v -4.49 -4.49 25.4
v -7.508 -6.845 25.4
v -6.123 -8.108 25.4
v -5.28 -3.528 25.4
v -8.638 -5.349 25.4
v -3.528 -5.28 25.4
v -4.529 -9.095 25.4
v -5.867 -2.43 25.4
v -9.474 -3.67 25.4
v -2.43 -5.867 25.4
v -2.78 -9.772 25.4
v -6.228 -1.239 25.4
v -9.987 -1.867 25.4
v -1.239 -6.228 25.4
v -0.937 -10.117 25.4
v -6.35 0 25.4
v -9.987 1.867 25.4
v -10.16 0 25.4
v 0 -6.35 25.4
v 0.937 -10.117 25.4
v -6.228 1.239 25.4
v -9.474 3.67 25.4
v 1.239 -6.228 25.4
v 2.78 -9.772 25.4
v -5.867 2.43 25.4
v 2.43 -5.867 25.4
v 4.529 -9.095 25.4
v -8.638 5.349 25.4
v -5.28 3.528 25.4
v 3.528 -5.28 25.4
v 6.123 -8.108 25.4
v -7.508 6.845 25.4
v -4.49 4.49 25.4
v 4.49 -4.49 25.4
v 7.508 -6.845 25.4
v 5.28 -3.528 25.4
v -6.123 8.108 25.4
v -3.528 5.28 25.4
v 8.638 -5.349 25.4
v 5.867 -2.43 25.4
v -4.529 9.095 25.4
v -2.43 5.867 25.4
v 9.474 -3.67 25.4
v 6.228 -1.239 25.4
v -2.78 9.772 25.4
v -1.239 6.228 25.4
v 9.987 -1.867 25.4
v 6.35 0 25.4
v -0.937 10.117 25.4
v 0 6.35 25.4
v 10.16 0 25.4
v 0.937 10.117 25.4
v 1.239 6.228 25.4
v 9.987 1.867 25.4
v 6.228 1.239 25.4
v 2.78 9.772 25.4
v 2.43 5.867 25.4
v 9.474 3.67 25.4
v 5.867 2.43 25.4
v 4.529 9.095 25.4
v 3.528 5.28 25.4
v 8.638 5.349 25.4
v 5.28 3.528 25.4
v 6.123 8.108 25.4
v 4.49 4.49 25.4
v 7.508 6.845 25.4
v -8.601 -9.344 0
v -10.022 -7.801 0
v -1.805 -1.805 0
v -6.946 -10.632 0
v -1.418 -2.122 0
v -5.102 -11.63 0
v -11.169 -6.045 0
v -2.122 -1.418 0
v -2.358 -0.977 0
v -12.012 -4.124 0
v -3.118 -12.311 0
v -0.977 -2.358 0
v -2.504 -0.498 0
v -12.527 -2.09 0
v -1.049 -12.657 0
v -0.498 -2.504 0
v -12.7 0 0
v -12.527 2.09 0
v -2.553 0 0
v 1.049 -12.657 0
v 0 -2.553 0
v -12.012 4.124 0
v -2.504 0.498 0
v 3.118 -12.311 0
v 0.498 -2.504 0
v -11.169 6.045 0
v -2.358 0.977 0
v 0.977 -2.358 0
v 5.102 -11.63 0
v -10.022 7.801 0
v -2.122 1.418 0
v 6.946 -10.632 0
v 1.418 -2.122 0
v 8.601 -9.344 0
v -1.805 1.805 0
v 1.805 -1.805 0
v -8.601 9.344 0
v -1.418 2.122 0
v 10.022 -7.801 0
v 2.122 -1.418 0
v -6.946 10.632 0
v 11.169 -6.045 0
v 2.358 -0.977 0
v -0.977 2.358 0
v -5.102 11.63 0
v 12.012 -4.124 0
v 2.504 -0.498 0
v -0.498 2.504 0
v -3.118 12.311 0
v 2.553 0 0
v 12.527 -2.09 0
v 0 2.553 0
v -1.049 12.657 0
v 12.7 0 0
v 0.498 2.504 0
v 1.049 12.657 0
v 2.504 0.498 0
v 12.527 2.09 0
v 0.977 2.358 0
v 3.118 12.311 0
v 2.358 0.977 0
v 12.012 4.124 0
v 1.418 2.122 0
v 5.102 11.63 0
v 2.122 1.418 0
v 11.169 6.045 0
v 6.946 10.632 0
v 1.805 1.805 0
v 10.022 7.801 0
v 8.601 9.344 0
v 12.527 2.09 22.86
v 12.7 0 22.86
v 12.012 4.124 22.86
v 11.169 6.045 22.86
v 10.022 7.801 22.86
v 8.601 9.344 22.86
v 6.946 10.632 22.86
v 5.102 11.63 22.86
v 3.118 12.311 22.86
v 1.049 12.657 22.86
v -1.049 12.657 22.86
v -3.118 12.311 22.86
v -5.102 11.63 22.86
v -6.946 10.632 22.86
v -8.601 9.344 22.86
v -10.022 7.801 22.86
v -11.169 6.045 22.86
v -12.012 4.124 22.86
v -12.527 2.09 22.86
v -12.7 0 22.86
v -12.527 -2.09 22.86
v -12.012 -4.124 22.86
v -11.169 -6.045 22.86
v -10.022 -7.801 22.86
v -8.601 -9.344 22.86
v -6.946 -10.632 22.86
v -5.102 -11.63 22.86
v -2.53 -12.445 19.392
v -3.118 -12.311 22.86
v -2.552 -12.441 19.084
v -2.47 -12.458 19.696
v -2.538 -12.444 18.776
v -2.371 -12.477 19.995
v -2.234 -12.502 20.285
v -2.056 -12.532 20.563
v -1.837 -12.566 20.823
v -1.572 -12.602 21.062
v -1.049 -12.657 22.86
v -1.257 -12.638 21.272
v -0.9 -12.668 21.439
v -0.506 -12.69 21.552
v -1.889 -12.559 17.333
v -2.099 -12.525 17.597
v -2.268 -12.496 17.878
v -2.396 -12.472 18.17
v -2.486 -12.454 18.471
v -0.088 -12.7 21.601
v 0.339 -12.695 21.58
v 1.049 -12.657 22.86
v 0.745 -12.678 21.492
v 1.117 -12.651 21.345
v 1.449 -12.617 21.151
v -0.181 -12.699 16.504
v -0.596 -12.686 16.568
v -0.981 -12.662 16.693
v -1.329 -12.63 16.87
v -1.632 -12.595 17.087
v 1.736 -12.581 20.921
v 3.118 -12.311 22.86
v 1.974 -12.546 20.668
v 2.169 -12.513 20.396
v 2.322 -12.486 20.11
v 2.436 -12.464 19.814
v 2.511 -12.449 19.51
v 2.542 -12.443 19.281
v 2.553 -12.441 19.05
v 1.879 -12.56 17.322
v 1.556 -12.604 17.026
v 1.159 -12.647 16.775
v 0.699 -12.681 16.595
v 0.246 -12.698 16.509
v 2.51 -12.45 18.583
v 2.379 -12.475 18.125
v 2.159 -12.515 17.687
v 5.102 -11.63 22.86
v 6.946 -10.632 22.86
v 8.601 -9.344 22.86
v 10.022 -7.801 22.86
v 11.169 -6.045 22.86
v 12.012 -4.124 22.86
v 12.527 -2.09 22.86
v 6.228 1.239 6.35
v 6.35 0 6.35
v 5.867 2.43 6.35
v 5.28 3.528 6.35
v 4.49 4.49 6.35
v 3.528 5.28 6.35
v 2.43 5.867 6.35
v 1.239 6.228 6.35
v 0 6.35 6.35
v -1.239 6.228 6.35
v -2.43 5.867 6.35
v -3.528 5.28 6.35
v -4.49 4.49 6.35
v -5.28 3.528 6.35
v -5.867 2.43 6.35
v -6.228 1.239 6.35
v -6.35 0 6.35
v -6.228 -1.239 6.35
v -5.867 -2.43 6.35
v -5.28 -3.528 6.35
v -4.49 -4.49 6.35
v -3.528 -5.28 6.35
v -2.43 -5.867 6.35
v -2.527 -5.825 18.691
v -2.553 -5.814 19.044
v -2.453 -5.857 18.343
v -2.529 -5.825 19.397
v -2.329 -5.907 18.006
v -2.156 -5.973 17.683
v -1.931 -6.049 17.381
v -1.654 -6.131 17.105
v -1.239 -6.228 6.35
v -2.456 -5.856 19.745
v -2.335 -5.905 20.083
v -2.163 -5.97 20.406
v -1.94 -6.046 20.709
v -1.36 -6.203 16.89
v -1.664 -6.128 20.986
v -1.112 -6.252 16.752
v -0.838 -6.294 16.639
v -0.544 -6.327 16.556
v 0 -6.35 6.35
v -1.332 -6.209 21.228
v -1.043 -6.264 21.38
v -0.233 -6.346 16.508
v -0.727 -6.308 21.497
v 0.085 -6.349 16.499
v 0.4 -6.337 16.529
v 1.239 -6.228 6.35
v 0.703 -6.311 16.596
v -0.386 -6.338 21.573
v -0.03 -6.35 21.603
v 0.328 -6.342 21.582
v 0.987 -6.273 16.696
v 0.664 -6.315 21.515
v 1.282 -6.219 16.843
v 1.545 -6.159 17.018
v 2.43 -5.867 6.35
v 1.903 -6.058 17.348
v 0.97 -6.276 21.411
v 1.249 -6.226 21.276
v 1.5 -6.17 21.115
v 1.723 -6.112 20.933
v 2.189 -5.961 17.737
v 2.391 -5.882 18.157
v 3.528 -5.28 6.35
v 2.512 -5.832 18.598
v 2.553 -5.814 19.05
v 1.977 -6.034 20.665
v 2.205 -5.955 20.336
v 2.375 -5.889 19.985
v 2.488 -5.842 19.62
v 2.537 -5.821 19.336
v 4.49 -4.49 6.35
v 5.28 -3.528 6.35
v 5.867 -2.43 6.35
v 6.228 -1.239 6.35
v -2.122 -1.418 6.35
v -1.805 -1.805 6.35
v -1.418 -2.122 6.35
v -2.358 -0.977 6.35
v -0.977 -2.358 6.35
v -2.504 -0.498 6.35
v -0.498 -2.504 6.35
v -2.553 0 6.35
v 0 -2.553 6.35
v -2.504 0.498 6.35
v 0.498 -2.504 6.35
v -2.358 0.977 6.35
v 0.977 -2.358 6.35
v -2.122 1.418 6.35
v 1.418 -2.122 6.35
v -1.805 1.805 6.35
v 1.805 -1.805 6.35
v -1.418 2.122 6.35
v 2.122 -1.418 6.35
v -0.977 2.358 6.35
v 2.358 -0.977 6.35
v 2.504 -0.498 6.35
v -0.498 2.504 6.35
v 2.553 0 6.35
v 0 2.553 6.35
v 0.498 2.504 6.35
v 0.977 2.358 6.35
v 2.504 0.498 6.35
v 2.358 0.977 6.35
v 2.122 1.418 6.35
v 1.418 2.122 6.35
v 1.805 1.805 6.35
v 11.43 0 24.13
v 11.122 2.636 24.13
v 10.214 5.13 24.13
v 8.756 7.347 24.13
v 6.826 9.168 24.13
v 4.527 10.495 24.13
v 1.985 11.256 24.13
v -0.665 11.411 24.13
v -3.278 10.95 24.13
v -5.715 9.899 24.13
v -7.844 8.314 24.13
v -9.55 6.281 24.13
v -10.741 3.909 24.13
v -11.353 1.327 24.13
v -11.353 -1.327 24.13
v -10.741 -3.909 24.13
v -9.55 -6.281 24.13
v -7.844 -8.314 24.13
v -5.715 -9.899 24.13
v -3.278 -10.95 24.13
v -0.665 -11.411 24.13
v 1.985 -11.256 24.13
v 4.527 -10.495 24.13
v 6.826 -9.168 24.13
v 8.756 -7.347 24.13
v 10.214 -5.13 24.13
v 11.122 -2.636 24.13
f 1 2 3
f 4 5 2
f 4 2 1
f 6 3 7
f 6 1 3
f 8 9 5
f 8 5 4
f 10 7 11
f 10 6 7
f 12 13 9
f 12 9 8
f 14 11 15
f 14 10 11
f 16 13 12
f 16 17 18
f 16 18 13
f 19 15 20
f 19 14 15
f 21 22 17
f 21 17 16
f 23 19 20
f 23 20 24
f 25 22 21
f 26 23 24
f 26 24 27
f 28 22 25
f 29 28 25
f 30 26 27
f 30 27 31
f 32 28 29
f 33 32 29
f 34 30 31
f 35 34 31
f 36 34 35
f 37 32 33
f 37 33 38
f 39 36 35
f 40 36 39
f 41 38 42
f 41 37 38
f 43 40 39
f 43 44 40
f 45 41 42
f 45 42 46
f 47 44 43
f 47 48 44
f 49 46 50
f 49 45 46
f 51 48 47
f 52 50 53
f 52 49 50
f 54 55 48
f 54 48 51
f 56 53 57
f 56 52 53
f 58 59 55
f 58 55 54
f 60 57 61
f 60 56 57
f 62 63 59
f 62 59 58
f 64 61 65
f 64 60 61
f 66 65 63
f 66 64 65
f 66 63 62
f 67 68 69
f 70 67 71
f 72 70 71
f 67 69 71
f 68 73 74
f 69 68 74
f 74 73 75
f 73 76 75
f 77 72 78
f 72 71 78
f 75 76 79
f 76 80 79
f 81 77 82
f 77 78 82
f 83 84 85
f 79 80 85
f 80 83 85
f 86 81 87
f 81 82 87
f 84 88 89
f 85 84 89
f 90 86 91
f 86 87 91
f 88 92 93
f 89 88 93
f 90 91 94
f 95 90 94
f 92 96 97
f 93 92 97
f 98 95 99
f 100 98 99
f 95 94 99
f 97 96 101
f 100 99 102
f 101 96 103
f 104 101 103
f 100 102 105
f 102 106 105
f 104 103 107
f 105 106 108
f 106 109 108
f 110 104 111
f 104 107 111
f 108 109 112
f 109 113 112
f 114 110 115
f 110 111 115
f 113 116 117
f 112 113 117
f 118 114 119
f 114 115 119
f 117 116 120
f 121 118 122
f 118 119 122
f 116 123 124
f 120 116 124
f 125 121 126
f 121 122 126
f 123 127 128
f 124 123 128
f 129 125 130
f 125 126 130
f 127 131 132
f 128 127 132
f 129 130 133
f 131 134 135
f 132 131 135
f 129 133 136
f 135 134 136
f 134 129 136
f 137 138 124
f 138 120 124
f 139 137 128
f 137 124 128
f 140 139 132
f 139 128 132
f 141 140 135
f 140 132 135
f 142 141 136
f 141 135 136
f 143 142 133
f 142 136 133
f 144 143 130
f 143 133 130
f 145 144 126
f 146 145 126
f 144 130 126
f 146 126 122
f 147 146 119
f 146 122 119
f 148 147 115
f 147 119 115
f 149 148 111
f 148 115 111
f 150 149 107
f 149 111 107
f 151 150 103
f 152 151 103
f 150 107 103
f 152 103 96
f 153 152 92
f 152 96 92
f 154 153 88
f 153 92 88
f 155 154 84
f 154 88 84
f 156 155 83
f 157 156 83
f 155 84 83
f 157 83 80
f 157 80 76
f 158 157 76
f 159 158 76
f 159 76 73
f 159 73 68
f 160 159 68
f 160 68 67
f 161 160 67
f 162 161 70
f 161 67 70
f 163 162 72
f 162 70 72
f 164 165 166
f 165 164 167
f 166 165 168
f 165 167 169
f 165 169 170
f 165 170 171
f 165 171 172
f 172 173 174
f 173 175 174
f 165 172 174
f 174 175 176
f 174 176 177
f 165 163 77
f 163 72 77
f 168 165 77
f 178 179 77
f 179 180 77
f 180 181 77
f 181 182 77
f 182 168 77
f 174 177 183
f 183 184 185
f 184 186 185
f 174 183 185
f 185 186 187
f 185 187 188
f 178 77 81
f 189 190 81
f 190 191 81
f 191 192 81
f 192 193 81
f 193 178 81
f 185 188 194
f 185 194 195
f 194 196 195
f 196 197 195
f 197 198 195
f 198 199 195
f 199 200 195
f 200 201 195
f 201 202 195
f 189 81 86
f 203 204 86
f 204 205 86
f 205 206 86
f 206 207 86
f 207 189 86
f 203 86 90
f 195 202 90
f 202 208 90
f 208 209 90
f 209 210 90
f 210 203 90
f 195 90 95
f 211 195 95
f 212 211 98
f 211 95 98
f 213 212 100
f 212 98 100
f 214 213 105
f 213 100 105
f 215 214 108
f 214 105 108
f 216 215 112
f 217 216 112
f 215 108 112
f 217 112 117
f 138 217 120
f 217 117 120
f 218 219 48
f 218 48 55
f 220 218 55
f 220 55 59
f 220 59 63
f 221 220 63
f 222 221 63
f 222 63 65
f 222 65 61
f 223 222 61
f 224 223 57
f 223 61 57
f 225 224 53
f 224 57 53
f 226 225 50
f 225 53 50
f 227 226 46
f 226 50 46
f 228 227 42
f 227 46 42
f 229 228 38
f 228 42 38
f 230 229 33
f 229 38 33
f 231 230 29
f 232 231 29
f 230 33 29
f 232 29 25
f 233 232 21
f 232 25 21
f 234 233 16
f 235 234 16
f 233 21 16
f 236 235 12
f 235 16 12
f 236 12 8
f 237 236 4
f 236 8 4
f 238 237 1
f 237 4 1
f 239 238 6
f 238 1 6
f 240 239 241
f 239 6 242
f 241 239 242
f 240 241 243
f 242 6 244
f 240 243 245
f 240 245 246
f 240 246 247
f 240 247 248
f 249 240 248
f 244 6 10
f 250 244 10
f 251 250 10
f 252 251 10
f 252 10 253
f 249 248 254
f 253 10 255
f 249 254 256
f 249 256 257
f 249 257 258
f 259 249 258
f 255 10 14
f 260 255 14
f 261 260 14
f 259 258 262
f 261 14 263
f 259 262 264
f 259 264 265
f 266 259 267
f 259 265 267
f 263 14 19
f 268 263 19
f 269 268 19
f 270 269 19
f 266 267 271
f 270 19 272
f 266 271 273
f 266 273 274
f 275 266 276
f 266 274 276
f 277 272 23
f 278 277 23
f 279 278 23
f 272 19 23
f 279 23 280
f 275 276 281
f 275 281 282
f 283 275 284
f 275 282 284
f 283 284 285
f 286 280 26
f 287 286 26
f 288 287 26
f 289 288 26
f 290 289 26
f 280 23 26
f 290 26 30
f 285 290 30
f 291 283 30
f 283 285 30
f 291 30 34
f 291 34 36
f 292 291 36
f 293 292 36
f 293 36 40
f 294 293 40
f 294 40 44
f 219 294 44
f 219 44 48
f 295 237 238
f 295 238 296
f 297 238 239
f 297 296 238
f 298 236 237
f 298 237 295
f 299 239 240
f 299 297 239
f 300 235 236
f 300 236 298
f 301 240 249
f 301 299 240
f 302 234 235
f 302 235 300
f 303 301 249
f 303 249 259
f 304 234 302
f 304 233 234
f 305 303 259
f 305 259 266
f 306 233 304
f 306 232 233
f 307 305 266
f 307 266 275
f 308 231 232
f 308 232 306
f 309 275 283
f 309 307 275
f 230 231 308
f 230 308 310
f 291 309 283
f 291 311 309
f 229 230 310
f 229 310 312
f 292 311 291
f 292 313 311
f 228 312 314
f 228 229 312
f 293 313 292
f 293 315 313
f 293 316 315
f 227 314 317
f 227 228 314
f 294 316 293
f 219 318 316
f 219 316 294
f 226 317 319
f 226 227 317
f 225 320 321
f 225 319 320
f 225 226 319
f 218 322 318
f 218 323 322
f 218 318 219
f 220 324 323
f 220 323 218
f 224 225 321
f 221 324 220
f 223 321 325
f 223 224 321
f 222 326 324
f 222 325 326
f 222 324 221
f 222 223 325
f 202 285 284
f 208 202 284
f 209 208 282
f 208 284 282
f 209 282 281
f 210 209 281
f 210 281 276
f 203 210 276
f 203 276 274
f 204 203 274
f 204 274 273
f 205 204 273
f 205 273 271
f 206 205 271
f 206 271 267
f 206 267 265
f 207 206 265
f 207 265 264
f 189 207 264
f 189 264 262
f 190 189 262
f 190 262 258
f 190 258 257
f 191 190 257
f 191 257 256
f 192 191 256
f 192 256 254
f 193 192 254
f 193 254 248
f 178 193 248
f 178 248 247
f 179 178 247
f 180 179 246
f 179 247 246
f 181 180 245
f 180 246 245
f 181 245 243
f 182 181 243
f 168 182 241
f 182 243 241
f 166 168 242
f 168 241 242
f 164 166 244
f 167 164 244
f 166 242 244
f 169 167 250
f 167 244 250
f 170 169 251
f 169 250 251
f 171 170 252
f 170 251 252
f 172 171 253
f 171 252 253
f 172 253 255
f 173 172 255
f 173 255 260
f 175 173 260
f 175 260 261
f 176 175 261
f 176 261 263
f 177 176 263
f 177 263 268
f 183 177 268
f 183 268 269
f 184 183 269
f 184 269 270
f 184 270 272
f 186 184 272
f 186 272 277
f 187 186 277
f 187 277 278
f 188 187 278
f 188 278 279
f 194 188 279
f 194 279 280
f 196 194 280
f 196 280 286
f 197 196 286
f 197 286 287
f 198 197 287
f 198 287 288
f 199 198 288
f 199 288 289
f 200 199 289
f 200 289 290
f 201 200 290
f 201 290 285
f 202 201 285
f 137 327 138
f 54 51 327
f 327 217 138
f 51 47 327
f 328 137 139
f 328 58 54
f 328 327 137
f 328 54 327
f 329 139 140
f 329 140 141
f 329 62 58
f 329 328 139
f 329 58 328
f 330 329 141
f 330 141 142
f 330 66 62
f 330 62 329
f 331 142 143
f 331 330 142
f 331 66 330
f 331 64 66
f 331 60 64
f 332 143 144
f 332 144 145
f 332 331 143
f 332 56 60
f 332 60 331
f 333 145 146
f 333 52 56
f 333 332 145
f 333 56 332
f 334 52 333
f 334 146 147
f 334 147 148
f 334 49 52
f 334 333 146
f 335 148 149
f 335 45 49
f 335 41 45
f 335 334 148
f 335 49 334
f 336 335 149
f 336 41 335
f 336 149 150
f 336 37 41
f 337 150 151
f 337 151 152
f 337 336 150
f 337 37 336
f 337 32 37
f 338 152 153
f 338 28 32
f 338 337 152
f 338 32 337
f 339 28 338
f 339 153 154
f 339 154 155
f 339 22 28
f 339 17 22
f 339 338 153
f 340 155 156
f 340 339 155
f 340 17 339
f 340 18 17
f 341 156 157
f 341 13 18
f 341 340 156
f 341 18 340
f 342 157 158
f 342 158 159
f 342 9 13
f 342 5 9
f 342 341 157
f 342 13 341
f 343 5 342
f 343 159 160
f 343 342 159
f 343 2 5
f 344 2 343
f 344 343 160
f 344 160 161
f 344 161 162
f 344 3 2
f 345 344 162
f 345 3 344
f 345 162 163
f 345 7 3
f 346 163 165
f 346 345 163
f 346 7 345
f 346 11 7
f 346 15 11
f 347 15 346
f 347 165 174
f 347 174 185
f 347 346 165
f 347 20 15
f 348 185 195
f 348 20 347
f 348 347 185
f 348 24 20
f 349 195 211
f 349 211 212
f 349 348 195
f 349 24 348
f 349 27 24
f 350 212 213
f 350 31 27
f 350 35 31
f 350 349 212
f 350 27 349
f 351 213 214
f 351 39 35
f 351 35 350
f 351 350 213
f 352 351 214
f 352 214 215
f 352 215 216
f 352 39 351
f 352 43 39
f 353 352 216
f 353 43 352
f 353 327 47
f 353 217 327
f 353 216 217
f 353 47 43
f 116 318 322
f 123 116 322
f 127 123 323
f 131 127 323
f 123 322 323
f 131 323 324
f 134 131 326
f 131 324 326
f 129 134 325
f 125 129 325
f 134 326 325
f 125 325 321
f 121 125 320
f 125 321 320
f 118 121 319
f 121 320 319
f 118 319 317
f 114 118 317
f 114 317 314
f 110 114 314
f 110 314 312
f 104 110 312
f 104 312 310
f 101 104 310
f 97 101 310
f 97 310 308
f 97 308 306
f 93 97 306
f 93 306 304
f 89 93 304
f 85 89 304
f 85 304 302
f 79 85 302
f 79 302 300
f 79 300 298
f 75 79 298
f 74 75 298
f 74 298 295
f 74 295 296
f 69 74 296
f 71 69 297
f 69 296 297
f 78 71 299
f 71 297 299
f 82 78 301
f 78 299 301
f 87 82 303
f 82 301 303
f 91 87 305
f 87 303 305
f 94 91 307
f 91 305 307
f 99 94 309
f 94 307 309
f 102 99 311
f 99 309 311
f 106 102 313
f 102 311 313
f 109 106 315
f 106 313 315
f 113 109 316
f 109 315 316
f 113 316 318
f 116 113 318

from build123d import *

# Parameters (mm, degrees)
SKETCH1_R           = 12.7
BOSS_EXTRUDE1_DEPTH = 25.4
SKETCH2_R           = 2.5527
CUT_EXTRUDE1_DEPTH  = 26.4
SKETCH3_R           = 6.35
CUT_EXTRUDE2_DEPTH  = 19.05
CHAMFER1_SIZE       = 2.54
SKETCH4_R           = 2.5527
CUT_EXTRUDE3_DEPTH  = 19.05


with BuildPart() as part:
    # Sketch1 → Boss-Extrude1 (new body)
    with BuildSketch(Plane.XY):
        Circle(SKETCH1_R)
    extrude(amount=BOSS_EXTRUDE1_DEPTH)

    # Sketch2 → Cut-Extrude1 (cut, through all)
    with BuildSketch(Plane.XY.offset(25.4)):
        Circle(SKETCH2_R)
    extrude(amount=-CUT_EXTRUDE1_DEPTH, mode=Mode.SUBTRACT)

    # Sketch3 → Cut-Extrude2 (cut)
    with BuildSketch(Plane.XY.offset(25.4)):
        Circle(SKETCH3_R)
    extrude(amount=-CUT_EXTRUDE2_DEPTH, mode=Mode.SUBTRACT)

    # Chamfer1
    chamfer1_edges = [part.edges().sort_by_distance(p)[0] for p in [
        (-12.7, 0, 25.4),
    ]]
    chamfer(chamfer1_edges, length=CHAMFER1_SIZE)

    # Sketch4 → Cut-Extrude3 (cut)
    with BuildSketch(Plane(origin=(0, 0, 0), x_dir=(1, 0, 0), z_dir=(0, 1, 0))):
        with Locations((0, -19.05)):
            Circle(SKETCH4_R)
    extrude(amount=-CUT_EXTRUDE3_DEPTH, mode=Mode.SUBTRACT)


solid = part.part
